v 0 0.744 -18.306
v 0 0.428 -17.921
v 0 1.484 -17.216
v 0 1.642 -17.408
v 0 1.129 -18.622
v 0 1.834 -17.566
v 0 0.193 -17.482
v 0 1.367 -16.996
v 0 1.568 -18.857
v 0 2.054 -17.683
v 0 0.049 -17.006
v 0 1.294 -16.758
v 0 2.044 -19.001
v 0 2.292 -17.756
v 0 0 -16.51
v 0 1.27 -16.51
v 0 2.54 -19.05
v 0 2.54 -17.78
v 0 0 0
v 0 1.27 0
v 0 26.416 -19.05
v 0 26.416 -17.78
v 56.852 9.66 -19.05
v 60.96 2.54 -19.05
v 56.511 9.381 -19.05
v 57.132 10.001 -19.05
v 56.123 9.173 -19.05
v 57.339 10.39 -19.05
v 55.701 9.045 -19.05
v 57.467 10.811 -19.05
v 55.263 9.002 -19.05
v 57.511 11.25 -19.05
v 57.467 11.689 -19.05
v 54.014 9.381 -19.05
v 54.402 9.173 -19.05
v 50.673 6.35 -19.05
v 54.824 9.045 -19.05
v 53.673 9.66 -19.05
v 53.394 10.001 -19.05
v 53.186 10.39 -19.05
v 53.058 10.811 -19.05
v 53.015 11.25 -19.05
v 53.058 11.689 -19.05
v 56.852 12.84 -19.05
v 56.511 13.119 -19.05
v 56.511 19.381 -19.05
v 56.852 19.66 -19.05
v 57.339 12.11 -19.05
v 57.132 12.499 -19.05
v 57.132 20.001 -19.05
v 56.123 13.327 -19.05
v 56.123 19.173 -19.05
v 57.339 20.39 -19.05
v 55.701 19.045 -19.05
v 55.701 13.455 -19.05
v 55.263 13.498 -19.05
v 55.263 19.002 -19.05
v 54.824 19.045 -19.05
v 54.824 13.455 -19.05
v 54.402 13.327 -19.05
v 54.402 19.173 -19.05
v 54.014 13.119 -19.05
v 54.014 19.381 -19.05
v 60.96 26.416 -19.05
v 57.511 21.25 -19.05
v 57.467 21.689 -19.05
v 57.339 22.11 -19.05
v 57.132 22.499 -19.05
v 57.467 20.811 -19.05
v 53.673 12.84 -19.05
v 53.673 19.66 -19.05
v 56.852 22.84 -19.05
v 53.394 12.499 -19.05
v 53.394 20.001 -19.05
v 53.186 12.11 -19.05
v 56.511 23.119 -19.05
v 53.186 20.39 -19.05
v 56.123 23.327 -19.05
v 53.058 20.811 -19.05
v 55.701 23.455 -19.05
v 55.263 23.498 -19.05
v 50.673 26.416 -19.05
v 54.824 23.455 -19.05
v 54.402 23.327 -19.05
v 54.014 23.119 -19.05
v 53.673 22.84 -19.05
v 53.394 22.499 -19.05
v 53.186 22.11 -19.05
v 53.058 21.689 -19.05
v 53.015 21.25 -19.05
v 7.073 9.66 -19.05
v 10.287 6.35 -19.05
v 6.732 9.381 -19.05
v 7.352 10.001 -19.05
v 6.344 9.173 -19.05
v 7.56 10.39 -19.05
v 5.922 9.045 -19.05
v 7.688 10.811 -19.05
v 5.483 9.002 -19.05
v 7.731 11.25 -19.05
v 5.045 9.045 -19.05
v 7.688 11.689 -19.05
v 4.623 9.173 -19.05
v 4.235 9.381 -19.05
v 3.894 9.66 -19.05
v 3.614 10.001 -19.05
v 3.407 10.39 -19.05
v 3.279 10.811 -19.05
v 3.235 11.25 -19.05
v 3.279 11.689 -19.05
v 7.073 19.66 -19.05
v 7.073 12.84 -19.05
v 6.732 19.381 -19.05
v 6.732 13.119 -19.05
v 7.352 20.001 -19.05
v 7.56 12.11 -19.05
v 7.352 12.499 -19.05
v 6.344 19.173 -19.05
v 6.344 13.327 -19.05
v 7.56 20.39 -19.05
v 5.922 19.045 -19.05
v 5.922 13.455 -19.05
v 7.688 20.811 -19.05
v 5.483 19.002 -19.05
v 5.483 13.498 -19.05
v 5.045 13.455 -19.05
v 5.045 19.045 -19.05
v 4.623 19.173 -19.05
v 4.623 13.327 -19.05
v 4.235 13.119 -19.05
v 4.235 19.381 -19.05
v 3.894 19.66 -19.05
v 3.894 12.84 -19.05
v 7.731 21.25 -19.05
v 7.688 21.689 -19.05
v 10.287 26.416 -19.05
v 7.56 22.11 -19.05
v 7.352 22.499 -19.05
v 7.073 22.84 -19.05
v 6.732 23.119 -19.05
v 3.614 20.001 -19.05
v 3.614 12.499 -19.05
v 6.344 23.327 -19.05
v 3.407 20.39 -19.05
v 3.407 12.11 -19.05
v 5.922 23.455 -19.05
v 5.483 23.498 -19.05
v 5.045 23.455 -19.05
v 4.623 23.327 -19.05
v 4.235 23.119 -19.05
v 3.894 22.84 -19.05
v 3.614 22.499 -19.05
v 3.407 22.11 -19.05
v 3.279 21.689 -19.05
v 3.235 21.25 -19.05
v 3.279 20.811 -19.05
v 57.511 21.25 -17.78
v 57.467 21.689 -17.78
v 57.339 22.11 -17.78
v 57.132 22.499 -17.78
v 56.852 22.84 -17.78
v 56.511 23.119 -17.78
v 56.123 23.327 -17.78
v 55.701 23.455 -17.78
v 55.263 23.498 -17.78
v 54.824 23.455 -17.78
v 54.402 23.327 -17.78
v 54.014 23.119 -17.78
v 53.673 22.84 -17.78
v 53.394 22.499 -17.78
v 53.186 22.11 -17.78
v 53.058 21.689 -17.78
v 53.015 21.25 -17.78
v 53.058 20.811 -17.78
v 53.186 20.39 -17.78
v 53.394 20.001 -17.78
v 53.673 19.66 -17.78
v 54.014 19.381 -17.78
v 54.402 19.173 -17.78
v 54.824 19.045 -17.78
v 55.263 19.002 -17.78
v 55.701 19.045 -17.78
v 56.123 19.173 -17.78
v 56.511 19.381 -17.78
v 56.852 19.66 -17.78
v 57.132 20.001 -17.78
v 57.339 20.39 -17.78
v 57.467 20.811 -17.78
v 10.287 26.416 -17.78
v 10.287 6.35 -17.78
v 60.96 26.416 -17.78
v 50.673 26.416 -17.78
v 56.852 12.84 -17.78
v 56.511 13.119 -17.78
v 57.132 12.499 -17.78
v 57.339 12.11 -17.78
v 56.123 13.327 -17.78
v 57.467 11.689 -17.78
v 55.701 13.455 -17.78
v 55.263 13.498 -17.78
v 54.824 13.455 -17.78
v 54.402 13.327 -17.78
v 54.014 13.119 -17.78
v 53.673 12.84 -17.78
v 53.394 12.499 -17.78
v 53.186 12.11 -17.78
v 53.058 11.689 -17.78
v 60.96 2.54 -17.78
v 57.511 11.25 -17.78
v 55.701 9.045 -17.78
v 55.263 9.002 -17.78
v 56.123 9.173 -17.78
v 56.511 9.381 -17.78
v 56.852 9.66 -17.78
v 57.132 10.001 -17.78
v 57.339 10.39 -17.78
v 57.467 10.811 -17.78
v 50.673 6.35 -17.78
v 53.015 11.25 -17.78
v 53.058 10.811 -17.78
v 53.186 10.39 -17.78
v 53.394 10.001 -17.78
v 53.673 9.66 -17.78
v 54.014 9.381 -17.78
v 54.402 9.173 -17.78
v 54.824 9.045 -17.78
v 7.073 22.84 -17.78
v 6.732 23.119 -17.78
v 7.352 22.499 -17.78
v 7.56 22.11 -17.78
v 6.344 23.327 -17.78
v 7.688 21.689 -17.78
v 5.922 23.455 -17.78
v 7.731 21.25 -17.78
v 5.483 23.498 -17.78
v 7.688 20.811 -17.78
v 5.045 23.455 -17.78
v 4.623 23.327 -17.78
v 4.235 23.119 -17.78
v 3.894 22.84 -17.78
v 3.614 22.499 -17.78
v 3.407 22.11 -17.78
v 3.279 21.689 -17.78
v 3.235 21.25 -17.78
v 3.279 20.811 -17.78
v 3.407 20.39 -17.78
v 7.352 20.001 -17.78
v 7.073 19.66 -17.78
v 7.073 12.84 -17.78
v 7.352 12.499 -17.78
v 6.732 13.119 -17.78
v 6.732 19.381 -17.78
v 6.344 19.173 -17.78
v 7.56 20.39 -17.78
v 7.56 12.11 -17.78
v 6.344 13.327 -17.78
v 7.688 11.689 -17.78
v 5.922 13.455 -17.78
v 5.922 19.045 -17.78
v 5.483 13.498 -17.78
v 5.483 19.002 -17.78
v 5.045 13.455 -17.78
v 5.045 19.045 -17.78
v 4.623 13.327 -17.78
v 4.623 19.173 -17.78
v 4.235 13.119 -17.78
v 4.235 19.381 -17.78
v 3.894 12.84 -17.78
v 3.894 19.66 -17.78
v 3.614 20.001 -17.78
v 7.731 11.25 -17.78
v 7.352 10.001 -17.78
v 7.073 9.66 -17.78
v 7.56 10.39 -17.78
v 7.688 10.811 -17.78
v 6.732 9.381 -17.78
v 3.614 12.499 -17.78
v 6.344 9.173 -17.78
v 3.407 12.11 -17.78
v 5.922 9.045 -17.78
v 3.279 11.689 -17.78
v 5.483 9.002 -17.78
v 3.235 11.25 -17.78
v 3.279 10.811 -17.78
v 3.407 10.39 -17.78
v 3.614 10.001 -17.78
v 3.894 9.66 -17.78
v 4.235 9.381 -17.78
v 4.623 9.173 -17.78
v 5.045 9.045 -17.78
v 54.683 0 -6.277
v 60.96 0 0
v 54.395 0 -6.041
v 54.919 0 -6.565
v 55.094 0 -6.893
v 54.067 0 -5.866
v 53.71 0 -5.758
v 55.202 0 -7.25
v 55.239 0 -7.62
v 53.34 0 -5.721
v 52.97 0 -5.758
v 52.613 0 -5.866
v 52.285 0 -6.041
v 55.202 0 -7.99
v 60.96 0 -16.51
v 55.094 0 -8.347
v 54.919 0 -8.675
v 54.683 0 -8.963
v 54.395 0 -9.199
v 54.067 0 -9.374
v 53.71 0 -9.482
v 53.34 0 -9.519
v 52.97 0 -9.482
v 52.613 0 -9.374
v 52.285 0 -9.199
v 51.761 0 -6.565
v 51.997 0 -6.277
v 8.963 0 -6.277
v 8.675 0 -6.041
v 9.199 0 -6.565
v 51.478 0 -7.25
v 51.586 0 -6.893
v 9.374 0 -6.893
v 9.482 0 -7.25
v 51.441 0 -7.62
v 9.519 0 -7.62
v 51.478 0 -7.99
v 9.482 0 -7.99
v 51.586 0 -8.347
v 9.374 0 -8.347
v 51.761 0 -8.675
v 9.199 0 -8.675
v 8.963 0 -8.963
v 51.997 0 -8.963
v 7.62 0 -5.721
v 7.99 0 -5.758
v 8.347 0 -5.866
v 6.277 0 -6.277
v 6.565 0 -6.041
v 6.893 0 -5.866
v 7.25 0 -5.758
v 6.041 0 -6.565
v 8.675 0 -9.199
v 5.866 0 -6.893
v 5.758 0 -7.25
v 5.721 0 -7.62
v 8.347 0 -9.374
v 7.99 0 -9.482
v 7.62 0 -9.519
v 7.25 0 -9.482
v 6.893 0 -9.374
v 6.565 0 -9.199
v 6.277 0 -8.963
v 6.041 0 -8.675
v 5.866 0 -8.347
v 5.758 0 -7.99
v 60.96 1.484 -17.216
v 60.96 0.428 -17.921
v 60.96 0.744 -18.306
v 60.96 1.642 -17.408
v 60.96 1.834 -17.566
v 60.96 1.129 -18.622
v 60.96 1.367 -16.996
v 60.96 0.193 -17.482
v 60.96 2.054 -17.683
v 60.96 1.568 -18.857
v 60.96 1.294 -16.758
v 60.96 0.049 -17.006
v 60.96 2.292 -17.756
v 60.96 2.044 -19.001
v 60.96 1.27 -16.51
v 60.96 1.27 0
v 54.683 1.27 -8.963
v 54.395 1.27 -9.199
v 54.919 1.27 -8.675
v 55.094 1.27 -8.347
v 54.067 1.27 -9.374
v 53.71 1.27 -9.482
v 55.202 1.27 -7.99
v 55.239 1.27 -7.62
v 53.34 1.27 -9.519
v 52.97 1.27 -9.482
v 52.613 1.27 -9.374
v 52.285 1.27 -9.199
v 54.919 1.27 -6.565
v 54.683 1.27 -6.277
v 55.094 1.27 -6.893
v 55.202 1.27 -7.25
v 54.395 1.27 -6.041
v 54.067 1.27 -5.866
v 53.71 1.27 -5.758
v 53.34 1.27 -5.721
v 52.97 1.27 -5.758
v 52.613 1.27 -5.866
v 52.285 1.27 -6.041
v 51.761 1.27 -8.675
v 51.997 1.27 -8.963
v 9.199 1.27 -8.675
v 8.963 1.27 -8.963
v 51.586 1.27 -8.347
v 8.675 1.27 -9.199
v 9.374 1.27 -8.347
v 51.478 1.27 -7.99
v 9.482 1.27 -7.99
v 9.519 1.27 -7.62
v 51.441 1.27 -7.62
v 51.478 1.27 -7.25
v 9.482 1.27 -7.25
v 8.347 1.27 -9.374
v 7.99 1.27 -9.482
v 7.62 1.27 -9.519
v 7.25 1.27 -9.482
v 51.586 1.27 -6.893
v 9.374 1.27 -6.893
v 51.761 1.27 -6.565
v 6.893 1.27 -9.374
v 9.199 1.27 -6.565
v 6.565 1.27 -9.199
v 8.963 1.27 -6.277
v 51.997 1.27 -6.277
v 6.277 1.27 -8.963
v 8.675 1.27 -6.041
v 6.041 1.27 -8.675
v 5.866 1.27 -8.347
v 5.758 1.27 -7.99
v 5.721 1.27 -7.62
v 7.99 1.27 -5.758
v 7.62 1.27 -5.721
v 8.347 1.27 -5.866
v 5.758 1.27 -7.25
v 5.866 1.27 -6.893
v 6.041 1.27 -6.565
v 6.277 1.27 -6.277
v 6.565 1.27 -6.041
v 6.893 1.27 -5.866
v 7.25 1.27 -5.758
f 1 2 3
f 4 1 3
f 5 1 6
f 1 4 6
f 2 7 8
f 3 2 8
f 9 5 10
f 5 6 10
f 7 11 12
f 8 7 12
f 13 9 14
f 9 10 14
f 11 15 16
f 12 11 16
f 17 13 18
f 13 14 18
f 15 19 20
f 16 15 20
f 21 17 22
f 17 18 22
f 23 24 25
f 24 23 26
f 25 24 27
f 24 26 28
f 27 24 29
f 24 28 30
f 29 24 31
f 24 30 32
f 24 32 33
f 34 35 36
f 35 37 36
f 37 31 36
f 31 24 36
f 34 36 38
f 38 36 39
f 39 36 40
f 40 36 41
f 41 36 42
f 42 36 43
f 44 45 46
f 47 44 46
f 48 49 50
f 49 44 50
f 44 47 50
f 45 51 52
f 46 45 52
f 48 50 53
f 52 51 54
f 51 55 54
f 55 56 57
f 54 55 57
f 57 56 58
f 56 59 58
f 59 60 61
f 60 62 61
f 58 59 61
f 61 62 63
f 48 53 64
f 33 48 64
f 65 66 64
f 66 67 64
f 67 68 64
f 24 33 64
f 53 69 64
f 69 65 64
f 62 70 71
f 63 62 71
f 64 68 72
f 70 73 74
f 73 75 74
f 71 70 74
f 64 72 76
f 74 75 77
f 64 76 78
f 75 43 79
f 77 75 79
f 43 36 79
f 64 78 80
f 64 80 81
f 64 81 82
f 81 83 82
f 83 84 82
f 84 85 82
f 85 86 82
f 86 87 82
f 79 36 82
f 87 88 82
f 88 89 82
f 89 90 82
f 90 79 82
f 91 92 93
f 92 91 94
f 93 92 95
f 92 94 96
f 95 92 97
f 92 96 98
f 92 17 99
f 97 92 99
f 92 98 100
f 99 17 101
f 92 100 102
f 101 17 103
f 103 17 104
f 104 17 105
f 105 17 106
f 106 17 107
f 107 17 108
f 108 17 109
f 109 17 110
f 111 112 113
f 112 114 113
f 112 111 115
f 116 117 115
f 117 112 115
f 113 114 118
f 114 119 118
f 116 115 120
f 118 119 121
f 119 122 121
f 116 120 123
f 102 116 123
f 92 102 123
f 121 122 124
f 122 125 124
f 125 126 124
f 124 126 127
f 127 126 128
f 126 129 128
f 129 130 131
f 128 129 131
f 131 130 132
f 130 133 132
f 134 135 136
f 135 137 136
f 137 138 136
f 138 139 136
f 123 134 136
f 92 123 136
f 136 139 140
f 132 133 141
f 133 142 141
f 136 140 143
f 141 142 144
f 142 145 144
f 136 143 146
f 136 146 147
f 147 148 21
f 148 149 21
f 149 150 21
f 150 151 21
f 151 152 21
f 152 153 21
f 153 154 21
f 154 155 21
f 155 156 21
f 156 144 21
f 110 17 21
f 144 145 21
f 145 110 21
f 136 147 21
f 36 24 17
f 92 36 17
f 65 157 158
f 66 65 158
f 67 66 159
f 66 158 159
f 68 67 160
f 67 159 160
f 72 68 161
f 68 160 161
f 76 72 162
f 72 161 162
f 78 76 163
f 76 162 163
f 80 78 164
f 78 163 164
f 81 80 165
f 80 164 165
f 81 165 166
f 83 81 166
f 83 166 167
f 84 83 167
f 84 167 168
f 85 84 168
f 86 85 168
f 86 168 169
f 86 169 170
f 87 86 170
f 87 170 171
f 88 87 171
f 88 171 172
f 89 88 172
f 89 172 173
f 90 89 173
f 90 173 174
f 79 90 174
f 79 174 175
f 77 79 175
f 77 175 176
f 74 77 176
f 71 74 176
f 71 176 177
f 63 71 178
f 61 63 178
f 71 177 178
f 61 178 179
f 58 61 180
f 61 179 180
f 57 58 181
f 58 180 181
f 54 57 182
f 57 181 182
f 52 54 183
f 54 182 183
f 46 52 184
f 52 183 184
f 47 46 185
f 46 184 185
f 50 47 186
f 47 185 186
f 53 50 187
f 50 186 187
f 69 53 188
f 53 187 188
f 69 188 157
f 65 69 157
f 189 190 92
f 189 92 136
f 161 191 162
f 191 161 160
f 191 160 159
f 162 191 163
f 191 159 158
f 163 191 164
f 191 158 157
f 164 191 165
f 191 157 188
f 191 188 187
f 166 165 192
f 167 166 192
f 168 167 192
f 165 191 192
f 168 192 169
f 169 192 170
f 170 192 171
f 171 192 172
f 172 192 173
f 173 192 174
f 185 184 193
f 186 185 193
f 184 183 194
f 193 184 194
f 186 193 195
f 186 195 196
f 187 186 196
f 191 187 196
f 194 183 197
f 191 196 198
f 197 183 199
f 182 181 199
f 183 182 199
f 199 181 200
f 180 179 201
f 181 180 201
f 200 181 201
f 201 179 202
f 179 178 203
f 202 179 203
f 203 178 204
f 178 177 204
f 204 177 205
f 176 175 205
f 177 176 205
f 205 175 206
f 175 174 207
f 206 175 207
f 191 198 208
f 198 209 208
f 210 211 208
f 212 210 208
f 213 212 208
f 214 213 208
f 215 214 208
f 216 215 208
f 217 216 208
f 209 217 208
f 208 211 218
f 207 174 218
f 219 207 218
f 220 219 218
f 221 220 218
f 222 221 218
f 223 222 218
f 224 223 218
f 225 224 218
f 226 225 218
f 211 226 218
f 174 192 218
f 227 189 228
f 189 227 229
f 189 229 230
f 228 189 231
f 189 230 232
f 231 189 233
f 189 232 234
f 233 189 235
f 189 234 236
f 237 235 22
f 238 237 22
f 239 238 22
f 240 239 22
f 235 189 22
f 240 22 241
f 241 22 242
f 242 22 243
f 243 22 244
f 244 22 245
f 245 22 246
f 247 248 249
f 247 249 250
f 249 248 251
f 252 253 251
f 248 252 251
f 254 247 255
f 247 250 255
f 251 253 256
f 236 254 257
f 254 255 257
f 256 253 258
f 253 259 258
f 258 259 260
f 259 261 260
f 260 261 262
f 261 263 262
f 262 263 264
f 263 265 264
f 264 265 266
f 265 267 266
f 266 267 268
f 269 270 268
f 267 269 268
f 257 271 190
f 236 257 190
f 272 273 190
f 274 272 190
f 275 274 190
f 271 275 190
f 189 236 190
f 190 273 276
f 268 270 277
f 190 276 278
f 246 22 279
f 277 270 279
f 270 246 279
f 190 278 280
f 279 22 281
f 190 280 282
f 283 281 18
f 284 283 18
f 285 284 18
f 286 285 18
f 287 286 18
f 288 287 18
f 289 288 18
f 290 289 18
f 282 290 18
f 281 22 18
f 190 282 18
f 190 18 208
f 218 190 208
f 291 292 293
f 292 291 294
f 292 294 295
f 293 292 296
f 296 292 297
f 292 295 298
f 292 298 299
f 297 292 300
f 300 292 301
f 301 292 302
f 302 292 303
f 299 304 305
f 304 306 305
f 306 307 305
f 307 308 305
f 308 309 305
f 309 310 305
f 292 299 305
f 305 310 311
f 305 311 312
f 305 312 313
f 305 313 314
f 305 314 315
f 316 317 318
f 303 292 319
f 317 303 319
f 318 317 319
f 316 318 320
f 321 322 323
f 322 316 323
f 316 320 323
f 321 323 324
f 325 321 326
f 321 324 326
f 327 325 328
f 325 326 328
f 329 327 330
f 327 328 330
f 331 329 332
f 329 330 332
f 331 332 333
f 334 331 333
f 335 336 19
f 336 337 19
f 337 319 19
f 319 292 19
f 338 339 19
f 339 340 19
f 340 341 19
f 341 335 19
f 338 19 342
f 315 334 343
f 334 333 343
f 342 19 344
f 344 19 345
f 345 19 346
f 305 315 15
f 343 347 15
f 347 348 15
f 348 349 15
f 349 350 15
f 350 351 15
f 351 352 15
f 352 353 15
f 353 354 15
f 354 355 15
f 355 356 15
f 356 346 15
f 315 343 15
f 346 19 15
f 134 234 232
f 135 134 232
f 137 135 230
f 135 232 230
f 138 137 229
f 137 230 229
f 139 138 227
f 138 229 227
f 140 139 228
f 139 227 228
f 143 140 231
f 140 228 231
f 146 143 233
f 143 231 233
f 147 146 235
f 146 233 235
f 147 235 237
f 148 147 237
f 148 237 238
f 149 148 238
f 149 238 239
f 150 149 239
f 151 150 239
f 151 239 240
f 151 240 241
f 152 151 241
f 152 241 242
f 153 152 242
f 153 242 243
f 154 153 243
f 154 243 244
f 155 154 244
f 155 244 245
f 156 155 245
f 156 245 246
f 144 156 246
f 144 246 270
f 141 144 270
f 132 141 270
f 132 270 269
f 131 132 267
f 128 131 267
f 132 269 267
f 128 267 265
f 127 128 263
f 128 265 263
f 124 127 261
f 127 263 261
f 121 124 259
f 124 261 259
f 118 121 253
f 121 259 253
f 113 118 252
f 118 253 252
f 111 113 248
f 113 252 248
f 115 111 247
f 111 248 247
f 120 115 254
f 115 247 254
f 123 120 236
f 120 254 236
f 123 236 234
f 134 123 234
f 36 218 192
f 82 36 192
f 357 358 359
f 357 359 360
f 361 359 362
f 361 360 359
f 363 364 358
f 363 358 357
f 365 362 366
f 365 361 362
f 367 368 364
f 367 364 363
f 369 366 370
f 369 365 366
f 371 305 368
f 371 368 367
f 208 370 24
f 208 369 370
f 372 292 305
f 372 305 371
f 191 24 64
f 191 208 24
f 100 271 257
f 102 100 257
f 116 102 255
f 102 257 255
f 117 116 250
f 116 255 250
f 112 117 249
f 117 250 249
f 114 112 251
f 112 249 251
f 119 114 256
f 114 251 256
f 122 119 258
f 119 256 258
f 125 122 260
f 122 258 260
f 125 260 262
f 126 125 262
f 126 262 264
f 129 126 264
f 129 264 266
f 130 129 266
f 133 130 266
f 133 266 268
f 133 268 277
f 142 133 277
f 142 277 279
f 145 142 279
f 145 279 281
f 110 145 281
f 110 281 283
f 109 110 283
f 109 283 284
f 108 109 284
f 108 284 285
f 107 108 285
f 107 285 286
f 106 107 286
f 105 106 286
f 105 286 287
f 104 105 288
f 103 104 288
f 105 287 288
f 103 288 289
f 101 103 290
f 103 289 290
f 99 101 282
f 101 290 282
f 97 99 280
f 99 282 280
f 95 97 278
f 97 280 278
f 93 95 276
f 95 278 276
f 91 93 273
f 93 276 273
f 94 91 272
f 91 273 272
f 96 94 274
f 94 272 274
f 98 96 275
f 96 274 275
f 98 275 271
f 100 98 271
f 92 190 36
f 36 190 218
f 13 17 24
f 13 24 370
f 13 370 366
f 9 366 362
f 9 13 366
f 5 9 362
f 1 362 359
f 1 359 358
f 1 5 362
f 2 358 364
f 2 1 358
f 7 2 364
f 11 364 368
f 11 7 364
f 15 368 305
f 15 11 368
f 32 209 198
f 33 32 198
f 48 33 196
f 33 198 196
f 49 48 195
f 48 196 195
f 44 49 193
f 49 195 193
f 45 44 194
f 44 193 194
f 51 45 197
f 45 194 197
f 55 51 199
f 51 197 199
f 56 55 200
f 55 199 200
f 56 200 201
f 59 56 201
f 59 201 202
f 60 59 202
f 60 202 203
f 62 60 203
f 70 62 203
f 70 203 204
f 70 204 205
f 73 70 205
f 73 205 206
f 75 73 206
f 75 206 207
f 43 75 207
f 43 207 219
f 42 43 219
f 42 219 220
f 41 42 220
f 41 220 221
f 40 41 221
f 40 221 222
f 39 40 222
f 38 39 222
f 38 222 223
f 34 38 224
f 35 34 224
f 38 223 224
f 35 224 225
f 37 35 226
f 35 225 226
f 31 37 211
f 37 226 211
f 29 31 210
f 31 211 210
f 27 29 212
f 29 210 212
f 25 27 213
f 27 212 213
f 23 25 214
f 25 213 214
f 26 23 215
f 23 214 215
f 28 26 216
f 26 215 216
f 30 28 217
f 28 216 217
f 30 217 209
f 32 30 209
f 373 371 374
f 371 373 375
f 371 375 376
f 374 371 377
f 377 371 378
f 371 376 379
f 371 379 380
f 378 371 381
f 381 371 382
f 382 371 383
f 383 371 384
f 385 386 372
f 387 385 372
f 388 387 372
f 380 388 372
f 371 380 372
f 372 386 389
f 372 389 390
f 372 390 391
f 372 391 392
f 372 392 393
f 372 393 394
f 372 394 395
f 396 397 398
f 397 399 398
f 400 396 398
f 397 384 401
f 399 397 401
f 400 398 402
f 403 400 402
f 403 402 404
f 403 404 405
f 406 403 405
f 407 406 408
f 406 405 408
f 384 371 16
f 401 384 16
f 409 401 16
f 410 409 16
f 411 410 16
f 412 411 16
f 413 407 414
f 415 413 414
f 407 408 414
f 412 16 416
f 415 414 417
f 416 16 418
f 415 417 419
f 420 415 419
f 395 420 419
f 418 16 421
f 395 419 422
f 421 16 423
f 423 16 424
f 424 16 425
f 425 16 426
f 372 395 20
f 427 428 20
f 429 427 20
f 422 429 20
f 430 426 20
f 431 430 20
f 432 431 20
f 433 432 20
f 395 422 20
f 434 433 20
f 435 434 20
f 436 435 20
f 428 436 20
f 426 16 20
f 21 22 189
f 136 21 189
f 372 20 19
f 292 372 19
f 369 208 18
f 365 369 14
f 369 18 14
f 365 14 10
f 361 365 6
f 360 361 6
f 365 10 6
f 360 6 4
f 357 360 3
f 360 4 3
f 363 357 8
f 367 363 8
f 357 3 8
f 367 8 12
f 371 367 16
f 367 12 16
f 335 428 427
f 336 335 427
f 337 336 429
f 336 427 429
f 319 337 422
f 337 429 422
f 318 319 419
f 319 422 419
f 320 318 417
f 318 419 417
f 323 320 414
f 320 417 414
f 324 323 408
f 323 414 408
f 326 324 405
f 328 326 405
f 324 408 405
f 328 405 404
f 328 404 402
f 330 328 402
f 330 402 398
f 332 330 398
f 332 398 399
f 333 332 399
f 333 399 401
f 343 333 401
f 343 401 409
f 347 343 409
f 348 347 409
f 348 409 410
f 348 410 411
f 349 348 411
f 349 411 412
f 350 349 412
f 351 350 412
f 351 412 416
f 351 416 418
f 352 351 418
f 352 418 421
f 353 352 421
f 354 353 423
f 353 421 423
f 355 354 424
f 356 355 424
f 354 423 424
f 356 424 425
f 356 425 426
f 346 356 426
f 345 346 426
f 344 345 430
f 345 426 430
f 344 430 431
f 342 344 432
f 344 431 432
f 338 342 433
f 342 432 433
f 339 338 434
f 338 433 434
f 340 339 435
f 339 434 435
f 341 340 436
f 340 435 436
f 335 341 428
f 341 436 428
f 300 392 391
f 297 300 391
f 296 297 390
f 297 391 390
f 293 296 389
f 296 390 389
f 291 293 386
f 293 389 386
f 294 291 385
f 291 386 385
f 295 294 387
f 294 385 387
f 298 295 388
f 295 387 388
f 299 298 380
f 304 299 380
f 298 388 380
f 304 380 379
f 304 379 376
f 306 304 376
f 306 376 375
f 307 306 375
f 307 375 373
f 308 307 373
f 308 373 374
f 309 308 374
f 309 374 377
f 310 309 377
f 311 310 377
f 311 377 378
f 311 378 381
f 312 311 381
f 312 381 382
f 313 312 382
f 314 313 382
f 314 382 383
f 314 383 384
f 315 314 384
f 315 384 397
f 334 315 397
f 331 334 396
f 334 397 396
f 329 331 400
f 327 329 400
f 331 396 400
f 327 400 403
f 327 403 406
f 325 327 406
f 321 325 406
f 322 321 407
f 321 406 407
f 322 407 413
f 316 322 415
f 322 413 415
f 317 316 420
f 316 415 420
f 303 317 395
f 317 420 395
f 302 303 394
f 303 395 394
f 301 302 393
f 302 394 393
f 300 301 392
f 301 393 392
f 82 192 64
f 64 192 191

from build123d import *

# Parameters (mm, degrees)
BOSS_EXTRUDE1_DEPTH    = 60.96
CONVERT_SOLID1_DEPTH   = 60.96
CONVERT_SOLID1_2_DEPTH = 60.96
SKETCH6_W              = 40.386
SKETCH6_H              = 20.066
CUT_EXTRUDE1_DEPTH     = 71.995158286
SKETCH8_R              = 1.89865
CUT_EXTRUDE2_DEPTH     = 71.767609116
SKETCH9_R              = 2.2479
CUT_EXTRUDE3_DEPTH     = 71.995158286
CUT_EXTRUDE4_DEPTH     = 71.995158286


# Read off the part's stored shape, not the designer's step: Convert-Solid1
with BuildPart() as part:
    # Sketch1 → Boss-Extrude1 (new body)
    with BuildSketch(Plane(origin=(0, 0, 0), x_dir=(0, 0, -1), z_dir=(1, 0, 0))):
        Polygon((0, 0), (19.05, 0), (19.05, 31.75), (17.78, 31.75), (17.78, 1.27), (0, 1.27), align=None)
    extrude(amount=BOSS_EXTRUDE1_DEPTH)

    # Convert-Solid1 outline → Convert-Solid1 (cut)
    with BuildSketch(Plane.YZ):
        with BuildLine():
            ThreePointArc((2.54, -19.05), (0.743948776, -18.306051224), (0, -16.51))
            Line((0, -16.51), (0, -19.05))
            Line((0, -19.05), (2.54, -19.05))
        make_face()
    extrude(amount=CONVERT_SOLID1_DEPTH, mode=Mode.SUBTRACT)

    # Convert-Solid1 2 outline → Convert-Solid1 2 (add)
    with BuildSketch(Plane.YZ):
        with BuildLine():
            ThreePointArc((2.54, -17.78), (1.641974388, -17.408025612), (1.27, -16.51))
            Line((1.27, -16.51), (1.27, -17.78))
            Line((1.27, -17.78), (2.54, -17.78))
        make_face()
    extrude(amount=CONVERT_SOLID1_2_DEPTH)

    # Sketch6 → Cut-Extrude1 (cut, through all)
    with BuildSketch(Plane.XY.offset(-17.78)):
        with Locations((30.48, 16.383)):
            Rectangle(SKETCH6_W, SKETCH6_H)
    extrude(amount=-CUT_EXTRUDE1_DEPTH, mode=Mode.SUBTRACT)

    # Sketch8 → Cut-Extrude2 (cut, through all)
    with BuildSketch(Plane(origin=(0, 1.27, 0), x_dir=(1, 0, 0), z_dir=(0, 1, 0))):
        with Locations(Location((7.62, 7.62, 0), (0, 0, 270))):
            Circle(SKETCH8_R)
        with Locations(Location((53.34, 7.62, 0), (0, 0, 270))):
            Circle(SKETCH8_R)
    extrude(amount=-CUT_EXTRUDE2_DEPTH, mode=Mode.SUBTRACT)

    # Sketch9 → Cut-Extrude3 (cut, through all)
    with BuildSketch(Plane.XY.offset(-17.78)):
        with Locations((5.483386699, 21.25)):
            Circle(SKETCH9_R)
        with Locations((5.483386699, 11.25)):
            Circle(SKETCH9_R)
        with Locations((55.262613301, 21.25)):
            Circle(SKETCH9_R)
        with Locations((55.262613301, 11.25)):
            Circle(SKETCH9_R)
    extrude(amount=-CUT_EXTRUDE3_DEPTH, mode=Mode.SUBTRACT)

    # Sketch10 → Cut-Extrude4 (cut, through all)
    with BuildSketch(Plane.XY.offset(-17.78)):
        Polygon((0, 26.416), (60.96, 26.416), (69.305073622, 29.055582779), (66.812292009, 41.145573602), (-9.342186268, 39.525265553), (-7.97115638, 29.055582779), (-7.223321897, 29.055582779), align=None)
    extrude(amount=-CUT_EXTRUDE4_DEPTH, mode=Mode.SUBTRACT)


solid = part.part
